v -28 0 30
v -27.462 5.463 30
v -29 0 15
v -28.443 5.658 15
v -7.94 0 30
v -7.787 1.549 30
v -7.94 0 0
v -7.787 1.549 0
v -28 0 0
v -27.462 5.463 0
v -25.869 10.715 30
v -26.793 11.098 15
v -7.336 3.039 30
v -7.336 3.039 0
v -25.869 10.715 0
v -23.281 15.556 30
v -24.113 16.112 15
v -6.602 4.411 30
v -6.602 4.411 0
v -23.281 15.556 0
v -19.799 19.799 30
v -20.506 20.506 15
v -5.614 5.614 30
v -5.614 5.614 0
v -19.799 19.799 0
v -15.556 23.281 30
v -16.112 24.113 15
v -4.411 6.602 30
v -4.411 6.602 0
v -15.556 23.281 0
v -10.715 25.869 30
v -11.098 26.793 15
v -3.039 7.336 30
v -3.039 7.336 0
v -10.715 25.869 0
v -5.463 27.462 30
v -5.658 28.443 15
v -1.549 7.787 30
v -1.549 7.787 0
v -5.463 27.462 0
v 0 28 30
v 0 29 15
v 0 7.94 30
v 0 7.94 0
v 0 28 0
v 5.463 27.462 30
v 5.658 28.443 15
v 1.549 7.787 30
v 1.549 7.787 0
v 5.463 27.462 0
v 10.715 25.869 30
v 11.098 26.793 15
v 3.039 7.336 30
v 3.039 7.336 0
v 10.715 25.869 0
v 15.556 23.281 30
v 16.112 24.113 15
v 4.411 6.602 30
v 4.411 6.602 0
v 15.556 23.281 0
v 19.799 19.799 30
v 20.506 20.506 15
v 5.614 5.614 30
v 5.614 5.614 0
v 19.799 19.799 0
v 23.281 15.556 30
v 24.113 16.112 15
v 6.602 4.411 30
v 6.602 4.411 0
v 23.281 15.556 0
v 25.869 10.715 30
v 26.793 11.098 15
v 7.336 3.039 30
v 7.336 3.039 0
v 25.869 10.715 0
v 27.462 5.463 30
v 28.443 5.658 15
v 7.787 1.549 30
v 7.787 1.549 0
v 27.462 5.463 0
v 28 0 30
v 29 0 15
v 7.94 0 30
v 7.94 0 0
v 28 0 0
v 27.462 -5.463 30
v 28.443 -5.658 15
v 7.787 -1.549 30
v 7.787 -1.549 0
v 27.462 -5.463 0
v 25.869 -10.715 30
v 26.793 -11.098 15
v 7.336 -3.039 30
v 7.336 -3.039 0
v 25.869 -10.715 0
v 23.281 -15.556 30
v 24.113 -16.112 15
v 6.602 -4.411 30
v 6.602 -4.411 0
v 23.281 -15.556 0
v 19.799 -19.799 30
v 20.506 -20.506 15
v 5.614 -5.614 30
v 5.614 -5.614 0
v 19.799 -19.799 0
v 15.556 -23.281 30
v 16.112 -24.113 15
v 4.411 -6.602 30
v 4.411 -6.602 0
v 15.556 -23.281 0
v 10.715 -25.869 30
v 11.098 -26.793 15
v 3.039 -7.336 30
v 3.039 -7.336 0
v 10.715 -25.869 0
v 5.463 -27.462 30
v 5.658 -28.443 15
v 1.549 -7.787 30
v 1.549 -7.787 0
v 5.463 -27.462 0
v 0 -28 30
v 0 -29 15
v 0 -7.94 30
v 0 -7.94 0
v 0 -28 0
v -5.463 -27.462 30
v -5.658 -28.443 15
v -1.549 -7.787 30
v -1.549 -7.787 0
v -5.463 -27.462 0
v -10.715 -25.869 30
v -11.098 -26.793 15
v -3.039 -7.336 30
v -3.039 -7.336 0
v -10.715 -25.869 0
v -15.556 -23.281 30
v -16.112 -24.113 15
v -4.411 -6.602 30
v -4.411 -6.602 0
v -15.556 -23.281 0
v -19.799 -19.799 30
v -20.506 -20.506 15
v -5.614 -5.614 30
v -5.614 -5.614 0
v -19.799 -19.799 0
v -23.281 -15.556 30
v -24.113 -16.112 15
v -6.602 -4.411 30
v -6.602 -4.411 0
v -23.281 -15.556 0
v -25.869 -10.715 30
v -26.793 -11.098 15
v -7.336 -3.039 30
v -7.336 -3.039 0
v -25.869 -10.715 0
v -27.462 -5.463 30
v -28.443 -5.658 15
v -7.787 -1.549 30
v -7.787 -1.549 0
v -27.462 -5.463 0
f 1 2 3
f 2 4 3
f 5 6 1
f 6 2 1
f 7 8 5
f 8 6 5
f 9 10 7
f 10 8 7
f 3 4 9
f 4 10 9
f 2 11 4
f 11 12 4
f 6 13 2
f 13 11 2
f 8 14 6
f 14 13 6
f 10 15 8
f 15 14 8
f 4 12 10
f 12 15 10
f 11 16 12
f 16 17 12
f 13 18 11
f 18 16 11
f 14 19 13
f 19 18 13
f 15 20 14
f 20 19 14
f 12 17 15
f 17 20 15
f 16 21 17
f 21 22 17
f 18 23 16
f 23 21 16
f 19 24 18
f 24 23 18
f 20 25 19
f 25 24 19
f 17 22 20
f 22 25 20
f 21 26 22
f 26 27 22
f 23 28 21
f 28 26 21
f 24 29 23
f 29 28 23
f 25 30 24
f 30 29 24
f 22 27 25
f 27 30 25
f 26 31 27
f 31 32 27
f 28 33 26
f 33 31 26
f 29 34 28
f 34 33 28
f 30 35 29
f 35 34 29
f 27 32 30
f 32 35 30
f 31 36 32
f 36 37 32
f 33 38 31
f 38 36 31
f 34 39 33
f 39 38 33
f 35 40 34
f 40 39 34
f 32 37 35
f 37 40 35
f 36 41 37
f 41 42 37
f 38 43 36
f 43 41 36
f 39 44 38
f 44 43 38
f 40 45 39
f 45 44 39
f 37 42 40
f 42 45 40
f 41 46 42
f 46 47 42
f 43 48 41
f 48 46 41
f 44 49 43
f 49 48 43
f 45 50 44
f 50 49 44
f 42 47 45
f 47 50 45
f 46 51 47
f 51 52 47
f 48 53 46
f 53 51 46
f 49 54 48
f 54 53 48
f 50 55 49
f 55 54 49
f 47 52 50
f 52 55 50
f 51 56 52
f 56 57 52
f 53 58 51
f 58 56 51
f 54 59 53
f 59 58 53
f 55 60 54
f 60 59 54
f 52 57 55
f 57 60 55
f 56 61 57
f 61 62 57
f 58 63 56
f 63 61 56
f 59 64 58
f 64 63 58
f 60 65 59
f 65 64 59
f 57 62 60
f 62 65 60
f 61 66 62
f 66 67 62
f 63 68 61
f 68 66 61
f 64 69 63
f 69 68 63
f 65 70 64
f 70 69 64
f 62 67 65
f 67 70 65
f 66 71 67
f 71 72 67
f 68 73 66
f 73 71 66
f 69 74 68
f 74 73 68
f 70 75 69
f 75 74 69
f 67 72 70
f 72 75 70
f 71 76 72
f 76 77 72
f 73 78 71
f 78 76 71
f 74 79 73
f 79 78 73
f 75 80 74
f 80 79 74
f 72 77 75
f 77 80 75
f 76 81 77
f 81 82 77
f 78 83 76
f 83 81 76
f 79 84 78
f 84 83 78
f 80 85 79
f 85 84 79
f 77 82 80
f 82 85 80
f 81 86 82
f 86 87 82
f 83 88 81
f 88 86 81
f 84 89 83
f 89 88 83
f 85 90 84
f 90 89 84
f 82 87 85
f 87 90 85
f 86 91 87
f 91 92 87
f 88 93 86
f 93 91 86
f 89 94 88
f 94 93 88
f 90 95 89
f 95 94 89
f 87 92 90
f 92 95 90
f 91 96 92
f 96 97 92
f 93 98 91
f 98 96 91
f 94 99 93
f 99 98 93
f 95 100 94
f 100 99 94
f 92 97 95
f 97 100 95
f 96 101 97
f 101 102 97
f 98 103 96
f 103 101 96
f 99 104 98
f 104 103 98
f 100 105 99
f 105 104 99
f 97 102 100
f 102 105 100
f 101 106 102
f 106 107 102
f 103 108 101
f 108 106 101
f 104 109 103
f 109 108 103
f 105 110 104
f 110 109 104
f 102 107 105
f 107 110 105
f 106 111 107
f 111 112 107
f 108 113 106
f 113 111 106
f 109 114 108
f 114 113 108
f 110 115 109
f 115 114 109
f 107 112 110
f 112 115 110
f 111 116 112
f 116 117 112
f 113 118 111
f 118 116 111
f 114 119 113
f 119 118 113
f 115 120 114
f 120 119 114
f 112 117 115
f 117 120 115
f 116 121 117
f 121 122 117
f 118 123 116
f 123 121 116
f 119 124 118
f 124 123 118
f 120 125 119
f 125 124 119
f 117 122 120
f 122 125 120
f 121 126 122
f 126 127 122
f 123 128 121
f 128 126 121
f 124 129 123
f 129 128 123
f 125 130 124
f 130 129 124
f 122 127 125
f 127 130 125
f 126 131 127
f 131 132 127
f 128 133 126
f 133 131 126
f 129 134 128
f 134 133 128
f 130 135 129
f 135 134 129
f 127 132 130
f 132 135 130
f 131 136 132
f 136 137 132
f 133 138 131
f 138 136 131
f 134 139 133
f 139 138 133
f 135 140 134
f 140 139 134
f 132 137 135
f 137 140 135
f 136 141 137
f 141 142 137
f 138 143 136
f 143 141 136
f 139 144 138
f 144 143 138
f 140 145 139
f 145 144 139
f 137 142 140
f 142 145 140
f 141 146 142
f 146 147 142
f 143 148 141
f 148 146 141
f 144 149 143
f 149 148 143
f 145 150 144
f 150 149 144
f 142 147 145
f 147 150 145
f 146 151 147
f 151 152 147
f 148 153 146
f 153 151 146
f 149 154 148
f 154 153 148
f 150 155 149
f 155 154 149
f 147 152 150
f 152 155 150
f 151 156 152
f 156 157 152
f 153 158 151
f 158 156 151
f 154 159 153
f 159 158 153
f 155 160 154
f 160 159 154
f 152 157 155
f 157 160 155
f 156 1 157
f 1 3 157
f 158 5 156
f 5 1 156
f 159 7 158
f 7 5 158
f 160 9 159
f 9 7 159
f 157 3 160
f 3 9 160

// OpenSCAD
$fn = 32;

// ----------------------------------------------------------------------
// Belt roller: 56 mm barrel, 30 mm wide, bore 15.88 mm
// ----------------------------------------------------------------------

// --- parameters (mm) ---
bore_d = 15.88;           // bore
barrel_d = 56;            // barrel diameter
roller_w = 30;            // roller width
crown = 1;                // crown height at mid width

roller_profile = [[7.94, 0], [28, 0], [29, 15], [28, 30], [7.94, 30]];

/* the profile stays clear of the axis, so the bore comes out of the revolve */
rotate_extrude() polygon(roller_profile);
